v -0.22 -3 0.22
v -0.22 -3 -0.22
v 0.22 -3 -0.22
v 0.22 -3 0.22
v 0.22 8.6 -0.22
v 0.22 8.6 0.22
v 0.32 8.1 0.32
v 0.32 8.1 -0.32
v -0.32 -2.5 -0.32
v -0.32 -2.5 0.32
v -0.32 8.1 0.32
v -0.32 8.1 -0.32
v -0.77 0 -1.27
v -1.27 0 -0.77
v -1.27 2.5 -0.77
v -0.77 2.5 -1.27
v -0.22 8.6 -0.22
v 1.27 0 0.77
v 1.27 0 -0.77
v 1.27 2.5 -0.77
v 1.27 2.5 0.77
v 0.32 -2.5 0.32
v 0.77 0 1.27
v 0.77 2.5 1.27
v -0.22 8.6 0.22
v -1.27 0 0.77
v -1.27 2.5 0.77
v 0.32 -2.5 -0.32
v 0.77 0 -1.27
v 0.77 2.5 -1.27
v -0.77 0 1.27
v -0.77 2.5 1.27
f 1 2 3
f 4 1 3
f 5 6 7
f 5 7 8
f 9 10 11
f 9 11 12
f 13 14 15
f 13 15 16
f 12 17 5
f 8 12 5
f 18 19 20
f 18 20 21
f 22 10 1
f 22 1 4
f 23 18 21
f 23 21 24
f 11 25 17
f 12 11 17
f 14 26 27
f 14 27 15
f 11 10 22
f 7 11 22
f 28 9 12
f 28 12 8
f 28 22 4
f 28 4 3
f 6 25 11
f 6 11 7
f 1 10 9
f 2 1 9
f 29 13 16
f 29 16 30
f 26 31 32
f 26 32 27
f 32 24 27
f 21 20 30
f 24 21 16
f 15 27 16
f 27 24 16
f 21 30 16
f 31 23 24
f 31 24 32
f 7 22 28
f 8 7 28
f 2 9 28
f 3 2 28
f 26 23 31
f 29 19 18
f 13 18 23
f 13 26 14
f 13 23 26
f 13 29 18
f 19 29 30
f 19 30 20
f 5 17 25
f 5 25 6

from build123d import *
from OCP.BRepFilletAPI import BRepFilletAPI_MakeChamfer

# Parameters (mm, degrees)
EXTRUDE_1_DEPTH      = 8.6
EXTRUDE_1_DEPTH_BACK = 3
SKETCH_1_W           = 0.64
SKETCH_1_H           = 0.64
CHAMFER_1_SIZE       = 0.5
CHAMFER_1_SIZE2      = 0.1
CHAMFER_2_SIZE       = 0.1
CHAMFER_2_SIZE2      = 0.5
EXTRUDE_2_DEPTH      = 2.5


with BuildPart() as part:
    # Эскиз1 → Бобышка-Вытянуть1 (new, two sides: drawn at the far end of the back side and taken through both)
    with BuildSketch(Plane(origin=(0, 0, 0), x_dir=(1, 0, 0), z_dir=(0, 1, 0)).offset(-EXTRUDE_1_DEPTH_BACK)):
        Rectangle(SKETCH_1_W, SKETCH_1_H)
    extrude(amount=EXTRUDE_1_DEPTH + EXTRUDE_1_DEPTH_BACK)

    # Фаска1: one chamfer whose edges measure the first distance from different faces: ONE call of the kernel's chamfer builder (chamfer() names one face for all edges)
    chamfer_1_edges_1 = [part.edges().sort_by_distance(p)[0] for p in [
        (-0.32, 8.6, 0),
    ]]
    chamfer_1_side_1 = [part.faces().sort_by_distance(p)[0] for p in [
        (-0.32, 2.8, 0),
    ]]
    chamfer_1_edges_2 = [part.edges().sort_by_distance(p)[0] for p in [
        (0, 8.6, 0.32),
    ]]
    chamfer_1_side_2 = [part.faces().sort_by_distance(p)[0] for p in [
        (0, 2.8, 0.32),
    ]]
    chamfer_1_edges_3 = [part.edges().sort_by_distance(p)[0] for p in [
        (0.32, 8.6, 0),
    ]]
    chamfer_1_side_3 = [part.faces().sort_by_distance(p)[0] for p in [
        (0.32, 2.8, 0),
    ]]
    chamfer_1_edges_4 = [part.edges().sort_by_distance(p)[0] for p in [
        (0, 8.6, -0.32),
    ]]
    chamfer_1_side_4 = [part.faces().sort_by_distance(p)[0] for p in [
        (0, 2.8, -0.32),
    ]]
    chamfer_1 = BRepFilletAPI_MakeChamfer(part.part.solid().wrapped)
    for e in chamfer_1_edges_1:
        chamfer_1.Add(CHAMFER_1_SIZE, CHAMFER_1_SIZE2, e.wrapped, chamfer_1_side_1[0].wrapped)  # the first distance lies on this face
    for e in chamfer_1_edges_2:
        chamfer_1.Add(CHAMFER_1_SIZE, CHAMFER_1_SIZE2, e.wrapped, chamfer_1_side_2[0].wrapped)  # the first distance lies on this face
    for e in chamfer_1_edges_3:
        chamfer_1.Add(CHAMFER_1_SIZE, CHAMFER_1_SIZE2, e.wrapped, chamfer_1_side_3[0].wrapped)  # the first distance lies on this face
    for e in chamfer_1_edges_4:
        chamfer_1.Add(CHAMFER_1_SIZE, CHAMFER_1_SIZE2, e.wrapped, chamfer_1_side_4[0].wrapped)  # the first distance lies on this face
    add(Compound.cast(chamfer_1.Shape()), mode=Mode.REPLACE)

    # Фаска2
    chamfer_2_edges = [part.edges().sort_by_distance(p)[0] for p in [
        (0.32, -3, 0),
        (0, -3, 0.32),
        (-0.32, -3, 0),
        (0, -3, -0.32),
    ]]
    chamfer_2_side = [part.faces().sort_by_distance(p)[0] for p in [
        (0, -3, 0),
    ]]
    chamfer(chamfer_2_edges, length=CHAMFER_2_SIZE, length2=CHAMFER_2_SIZE2, reference=chamfer_2_side[0])


with BuildPart() as body_2:
    # Эскиз2 → Бобышка-Вытянуть2 (new body)
    with BuildSketch(Plane(origin=(0, 0, 0), x_dir=(1, 0, 0), z_dir=(0, 1, 0))):
        Polygon((-1.27, 0.77), (-0.77, 1.27), (0.77, 1.27), (1.27, 0.77), (1.27, -0.77), (0.77, -1.27), (-0.77, -1.27), (-1.27, -0.77), align=None)
    extrude(amount=EXTRUDE_2_DEPTH)


solid = Compound([part.part, body_2.part])
